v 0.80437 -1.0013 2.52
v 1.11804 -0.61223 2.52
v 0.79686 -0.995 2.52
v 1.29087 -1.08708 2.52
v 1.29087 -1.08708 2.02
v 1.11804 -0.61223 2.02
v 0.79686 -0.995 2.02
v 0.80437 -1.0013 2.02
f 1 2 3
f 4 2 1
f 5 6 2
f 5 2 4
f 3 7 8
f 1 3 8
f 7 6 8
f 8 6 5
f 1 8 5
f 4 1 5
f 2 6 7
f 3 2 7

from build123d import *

# Parameters (mm, degrees)
BOX034_W               = 1
BOX034_H               = 1
BOX034_DEPTH           = 0.5
BOX034_PLACEMENT_ANGLE = 30
BOX035_W               = 1
BOX035_H               = 1
BOX035_DEPTH           = 0.5
BOX035_PLACEMENT_ANGLE = 60
BOX033_W               = 0.5
BOX033_H               = 0.5
BOX033_DEPTH           = 0.5
CUT024_PLACEMENT_ANGLE = 230


with BuildPart() as kub034:
    # Box034 → Box034 (new body)
    with BuildSketch(Plane.XY):
        with Locations((0.5, 0.5)):
            Rectangle(BOX034_W, BOX034_H)
    extrude(amount=BOX034_DEPTH)


with BuildPart() as kub034_1:
    # Box034 placement: moved
    add(kub034.part.moved(Location((0.4, 1, 2.02))).rotate(Axis((0.4, 1, 2.02), (0, 0, 1)), BOX034_PLACEMENT_ANGLE))


with BuildPart() as kub035:
    # Box035 → Box035 (new body)
    with BuildSketch(Plane.XY):
        with Locations((0.5, 0.5)):
            Rectangle(BOX035_W, BOX035_H)
    extrude(amount=BOX035_DEPTH)


with BuildPart() as kub035_1:
    # Box035 placement: moved
    add(kub035.part.moved(Location((-0.394, 1, 2.02))).rotate(Axis((-0.394, 1, 2.02), (0, 0, 1)), BOX035_PLACEMENT_ANGLE))


with BuildPart() as cut024:
    # Box033 → Box033 (new body)
    with BuildSketch(Plane(origin=(-0.25, 1.25, 2.02), x_dir=(1, 0, 0), z_dir=(0, 0, 1))):
        with Locations((0.25, 0.25)):
            Rectangle(BOX033_W, BOX033_H)
    extrude(amount=BOX033_DEPTH)

    # Cut023: cut Kub035
    add(kub035_1.part, mode=Mode.SUBTRACT)

    # Cut024: cut Kub034
    add(kub034_1.part, mode=Mode.SUBTRACT)


with BuildPart() as cut024_1:
    # Cut024 placement: moved
    add(cut024.part.rotate(Axis((0, 0, 0), (0, 0, 1)), CUT024_PLACEMENT_ANGLE))


solid = cut024_1.part
